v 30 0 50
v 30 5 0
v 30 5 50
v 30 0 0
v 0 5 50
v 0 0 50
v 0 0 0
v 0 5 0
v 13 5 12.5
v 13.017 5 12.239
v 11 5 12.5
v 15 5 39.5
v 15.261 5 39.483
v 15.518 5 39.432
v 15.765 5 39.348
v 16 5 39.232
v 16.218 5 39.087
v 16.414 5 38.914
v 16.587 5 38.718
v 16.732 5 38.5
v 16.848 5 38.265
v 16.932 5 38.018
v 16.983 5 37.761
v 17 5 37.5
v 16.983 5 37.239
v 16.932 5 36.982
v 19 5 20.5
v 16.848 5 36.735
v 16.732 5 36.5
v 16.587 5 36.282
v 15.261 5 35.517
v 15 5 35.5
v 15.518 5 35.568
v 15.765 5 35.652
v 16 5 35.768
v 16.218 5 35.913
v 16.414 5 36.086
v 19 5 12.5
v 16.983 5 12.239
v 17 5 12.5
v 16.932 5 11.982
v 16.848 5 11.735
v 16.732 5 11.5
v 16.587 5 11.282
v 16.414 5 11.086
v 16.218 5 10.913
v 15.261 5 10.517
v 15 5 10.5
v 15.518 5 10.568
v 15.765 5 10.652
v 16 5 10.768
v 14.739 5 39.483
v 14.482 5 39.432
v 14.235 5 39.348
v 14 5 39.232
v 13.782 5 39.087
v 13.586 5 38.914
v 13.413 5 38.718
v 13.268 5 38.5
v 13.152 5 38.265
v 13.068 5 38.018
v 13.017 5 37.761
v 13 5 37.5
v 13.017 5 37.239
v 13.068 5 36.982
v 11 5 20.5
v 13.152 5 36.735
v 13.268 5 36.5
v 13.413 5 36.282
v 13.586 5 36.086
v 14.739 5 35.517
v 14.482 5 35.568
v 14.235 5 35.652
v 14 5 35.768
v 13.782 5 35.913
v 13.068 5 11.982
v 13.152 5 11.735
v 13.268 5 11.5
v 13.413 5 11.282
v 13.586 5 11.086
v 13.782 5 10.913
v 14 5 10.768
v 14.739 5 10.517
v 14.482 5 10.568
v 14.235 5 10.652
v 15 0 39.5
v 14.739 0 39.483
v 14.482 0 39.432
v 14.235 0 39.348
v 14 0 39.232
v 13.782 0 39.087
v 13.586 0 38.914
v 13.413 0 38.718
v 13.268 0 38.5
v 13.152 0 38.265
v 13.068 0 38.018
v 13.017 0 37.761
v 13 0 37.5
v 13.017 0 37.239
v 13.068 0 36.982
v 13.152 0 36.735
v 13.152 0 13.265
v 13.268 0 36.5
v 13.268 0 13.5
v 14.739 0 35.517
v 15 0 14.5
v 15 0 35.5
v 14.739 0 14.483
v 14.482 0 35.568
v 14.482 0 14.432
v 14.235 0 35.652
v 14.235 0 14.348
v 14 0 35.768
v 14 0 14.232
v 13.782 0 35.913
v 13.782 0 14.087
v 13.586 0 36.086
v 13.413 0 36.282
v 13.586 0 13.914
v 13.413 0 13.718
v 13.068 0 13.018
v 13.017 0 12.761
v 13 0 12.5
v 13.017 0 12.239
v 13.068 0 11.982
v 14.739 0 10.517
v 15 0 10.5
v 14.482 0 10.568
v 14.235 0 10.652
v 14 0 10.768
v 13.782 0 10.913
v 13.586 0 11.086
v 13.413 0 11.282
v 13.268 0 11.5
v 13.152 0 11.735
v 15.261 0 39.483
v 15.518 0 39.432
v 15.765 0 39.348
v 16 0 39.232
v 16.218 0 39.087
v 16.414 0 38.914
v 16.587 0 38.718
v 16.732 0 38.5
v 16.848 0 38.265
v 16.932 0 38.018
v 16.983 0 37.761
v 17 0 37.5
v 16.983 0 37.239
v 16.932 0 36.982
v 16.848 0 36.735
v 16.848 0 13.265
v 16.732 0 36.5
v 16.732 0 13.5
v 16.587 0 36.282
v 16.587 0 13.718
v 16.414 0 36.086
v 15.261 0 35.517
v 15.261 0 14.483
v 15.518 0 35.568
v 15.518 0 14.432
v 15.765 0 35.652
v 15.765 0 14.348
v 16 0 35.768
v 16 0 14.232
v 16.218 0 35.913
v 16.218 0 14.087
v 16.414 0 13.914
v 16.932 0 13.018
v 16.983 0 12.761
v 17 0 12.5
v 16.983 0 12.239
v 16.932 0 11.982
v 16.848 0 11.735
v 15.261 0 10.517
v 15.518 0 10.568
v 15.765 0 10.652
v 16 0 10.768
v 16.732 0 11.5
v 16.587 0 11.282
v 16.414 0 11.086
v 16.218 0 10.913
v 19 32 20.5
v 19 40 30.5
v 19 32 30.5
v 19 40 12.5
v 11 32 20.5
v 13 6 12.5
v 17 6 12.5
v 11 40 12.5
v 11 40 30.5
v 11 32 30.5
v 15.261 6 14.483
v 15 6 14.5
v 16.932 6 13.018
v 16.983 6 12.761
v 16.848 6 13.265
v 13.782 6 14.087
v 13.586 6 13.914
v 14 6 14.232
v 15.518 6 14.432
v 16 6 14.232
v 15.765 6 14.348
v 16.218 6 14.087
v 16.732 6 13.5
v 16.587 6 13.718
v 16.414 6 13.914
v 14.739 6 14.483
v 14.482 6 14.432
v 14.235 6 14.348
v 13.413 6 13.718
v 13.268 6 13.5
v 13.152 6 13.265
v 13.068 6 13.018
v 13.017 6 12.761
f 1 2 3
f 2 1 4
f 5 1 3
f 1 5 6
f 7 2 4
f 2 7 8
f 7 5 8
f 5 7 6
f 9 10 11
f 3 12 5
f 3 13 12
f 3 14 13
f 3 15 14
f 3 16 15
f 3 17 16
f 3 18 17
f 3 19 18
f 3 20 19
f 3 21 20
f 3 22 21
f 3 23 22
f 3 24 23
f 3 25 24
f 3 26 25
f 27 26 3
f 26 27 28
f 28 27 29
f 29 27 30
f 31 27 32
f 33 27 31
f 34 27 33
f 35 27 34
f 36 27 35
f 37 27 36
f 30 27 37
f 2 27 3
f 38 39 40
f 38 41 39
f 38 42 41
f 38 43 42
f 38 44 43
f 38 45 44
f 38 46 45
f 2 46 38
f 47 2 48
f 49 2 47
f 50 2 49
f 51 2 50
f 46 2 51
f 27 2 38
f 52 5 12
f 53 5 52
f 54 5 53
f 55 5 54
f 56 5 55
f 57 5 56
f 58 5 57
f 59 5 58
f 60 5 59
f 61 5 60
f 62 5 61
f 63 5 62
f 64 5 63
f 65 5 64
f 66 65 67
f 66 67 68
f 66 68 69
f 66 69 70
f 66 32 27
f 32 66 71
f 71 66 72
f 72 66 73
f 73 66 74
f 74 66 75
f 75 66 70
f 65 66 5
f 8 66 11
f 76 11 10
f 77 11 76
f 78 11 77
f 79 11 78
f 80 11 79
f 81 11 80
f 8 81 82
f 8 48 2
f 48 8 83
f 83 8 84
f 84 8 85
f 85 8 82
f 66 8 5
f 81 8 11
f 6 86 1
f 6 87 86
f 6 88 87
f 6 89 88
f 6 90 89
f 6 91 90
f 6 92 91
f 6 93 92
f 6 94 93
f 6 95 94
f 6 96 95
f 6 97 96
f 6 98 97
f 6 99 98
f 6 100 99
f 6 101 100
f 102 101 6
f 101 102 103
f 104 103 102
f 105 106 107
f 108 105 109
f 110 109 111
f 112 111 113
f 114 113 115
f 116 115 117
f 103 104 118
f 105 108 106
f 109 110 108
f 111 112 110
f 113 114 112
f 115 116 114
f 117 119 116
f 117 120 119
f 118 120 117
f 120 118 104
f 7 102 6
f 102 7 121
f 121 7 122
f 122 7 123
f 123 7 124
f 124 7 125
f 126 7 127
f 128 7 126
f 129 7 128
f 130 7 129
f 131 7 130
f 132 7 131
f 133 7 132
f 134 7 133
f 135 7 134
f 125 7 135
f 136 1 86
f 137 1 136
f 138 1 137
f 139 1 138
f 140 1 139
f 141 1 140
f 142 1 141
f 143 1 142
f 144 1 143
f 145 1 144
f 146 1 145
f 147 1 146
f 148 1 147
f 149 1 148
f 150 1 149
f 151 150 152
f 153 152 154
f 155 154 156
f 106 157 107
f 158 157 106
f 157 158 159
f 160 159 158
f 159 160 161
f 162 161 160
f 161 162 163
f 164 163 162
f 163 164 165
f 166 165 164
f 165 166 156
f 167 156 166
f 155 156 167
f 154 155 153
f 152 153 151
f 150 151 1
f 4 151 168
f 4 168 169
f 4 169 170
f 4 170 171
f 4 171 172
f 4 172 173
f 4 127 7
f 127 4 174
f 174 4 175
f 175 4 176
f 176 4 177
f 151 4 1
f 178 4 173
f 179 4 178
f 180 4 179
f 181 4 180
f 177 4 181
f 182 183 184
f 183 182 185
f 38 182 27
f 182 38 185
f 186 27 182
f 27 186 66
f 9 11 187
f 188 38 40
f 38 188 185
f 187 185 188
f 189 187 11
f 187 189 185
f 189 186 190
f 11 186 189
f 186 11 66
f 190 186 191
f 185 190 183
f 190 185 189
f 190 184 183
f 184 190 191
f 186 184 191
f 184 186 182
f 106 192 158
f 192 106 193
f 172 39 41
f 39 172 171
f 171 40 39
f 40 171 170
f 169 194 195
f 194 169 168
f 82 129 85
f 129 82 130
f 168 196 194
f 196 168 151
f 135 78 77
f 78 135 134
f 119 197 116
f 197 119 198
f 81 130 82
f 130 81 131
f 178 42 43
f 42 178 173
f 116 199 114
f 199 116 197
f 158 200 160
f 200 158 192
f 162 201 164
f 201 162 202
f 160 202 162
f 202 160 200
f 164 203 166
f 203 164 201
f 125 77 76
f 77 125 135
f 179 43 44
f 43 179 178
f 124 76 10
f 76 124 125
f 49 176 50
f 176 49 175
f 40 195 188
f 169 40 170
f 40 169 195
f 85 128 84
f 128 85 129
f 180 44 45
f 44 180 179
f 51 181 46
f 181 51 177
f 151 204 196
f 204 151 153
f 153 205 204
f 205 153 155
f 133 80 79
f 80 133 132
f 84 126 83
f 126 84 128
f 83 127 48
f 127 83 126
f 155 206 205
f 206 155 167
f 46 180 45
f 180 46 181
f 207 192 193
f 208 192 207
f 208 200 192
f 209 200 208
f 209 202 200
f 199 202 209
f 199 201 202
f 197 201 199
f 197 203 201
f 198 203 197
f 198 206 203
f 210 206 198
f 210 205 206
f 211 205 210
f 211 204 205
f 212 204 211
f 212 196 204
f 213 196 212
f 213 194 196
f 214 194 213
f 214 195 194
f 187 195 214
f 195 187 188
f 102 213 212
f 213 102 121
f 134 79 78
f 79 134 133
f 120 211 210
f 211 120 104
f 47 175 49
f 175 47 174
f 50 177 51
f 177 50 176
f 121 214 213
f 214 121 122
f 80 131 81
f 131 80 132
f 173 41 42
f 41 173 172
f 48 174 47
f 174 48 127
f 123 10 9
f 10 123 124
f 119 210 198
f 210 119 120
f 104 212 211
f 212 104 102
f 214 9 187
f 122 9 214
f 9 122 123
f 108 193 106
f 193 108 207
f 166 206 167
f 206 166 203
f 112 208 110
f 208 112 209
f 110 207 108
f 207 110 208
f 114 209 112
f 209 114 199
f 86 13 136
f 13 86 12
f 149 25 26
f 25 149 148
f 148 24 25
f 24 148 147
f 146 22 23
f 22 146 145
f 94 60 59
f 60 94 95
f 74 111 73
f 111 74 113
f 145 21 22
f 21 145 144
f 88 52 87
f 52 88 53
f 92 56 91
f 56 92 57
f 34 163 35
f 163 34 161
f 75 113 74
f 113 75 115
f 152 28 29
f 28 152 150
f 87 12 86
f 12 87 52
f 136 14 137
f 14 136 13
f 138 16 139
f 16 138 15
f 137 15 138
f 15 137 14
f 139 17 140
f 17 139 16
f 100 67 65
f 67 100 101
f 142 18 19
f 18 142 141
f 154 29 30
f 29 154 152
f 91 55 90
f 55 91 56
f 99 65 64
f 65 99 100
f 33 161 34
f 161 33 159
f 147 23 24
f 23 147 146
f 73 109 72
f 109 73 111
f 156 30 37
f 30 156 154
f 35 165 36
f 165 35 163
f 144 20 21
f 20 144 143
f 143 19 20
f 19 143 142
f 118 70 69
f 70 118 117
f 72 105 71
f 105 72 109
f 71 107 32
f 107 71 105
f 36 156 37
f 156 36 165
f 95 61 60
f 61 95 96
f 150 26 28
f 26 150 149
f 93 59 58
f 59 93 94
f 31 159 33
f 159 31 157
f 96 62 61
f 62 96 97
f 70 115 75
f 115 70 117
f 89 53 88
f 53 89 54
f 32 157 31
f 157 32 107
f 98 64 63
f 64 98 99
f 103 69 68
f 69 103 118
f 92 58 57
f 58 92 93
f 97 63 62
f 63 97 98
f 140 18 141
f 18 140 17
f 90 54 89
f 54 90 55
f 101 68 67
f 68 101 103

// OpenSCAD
// J-hook wall hook - a backplate with mounting holes and a projecting hook with an upturned
// tip. NOVEL general part.
//
// @desc wall J-hook with a backplate and two mounting holes
// @prompt Design a wall hook in OpenSCAD: a {plate_w} mm wide backplate with two {screw} mm mounting holes, and a hook that projects {reach} mm then turns up {lip} mm. Reply with a single complete OpenSCAD file.
// @param plate_w backplate width, mm      [20:50]
// @param reach   hook projection, mm      [20:70]
// @param lip     upturn height, mm        [8:30]
// @param screw   screw hole diameter, mm  [3:6]

plate_w = 30;
reach   = 40;
lip     = 18;
screw   = 4;

$fn = 48;

plate_h = 50;
t       = 5;
arm     = 8;

difference() {
    union() {
        cube([plate_w, t, plate_h]);                                              // backplate
        translate([plate_w / 2 - arm / 2, 0, plate_h * 0.25]) cube([arm, reach, arm]);           // arm
        translate([plate_w / 2 - arm / 2, reach - arm, plate_h * 0.25]) cube([arm, arm, lip]);   // upturned tip
    }
    for (z = [plate_h * 0.25, plate_h * 0.75])
        translate([plate_w / 2, -1, z]) rotate([-90, 0, 0]) cylinder(h = t + 2, d = screw);
}
